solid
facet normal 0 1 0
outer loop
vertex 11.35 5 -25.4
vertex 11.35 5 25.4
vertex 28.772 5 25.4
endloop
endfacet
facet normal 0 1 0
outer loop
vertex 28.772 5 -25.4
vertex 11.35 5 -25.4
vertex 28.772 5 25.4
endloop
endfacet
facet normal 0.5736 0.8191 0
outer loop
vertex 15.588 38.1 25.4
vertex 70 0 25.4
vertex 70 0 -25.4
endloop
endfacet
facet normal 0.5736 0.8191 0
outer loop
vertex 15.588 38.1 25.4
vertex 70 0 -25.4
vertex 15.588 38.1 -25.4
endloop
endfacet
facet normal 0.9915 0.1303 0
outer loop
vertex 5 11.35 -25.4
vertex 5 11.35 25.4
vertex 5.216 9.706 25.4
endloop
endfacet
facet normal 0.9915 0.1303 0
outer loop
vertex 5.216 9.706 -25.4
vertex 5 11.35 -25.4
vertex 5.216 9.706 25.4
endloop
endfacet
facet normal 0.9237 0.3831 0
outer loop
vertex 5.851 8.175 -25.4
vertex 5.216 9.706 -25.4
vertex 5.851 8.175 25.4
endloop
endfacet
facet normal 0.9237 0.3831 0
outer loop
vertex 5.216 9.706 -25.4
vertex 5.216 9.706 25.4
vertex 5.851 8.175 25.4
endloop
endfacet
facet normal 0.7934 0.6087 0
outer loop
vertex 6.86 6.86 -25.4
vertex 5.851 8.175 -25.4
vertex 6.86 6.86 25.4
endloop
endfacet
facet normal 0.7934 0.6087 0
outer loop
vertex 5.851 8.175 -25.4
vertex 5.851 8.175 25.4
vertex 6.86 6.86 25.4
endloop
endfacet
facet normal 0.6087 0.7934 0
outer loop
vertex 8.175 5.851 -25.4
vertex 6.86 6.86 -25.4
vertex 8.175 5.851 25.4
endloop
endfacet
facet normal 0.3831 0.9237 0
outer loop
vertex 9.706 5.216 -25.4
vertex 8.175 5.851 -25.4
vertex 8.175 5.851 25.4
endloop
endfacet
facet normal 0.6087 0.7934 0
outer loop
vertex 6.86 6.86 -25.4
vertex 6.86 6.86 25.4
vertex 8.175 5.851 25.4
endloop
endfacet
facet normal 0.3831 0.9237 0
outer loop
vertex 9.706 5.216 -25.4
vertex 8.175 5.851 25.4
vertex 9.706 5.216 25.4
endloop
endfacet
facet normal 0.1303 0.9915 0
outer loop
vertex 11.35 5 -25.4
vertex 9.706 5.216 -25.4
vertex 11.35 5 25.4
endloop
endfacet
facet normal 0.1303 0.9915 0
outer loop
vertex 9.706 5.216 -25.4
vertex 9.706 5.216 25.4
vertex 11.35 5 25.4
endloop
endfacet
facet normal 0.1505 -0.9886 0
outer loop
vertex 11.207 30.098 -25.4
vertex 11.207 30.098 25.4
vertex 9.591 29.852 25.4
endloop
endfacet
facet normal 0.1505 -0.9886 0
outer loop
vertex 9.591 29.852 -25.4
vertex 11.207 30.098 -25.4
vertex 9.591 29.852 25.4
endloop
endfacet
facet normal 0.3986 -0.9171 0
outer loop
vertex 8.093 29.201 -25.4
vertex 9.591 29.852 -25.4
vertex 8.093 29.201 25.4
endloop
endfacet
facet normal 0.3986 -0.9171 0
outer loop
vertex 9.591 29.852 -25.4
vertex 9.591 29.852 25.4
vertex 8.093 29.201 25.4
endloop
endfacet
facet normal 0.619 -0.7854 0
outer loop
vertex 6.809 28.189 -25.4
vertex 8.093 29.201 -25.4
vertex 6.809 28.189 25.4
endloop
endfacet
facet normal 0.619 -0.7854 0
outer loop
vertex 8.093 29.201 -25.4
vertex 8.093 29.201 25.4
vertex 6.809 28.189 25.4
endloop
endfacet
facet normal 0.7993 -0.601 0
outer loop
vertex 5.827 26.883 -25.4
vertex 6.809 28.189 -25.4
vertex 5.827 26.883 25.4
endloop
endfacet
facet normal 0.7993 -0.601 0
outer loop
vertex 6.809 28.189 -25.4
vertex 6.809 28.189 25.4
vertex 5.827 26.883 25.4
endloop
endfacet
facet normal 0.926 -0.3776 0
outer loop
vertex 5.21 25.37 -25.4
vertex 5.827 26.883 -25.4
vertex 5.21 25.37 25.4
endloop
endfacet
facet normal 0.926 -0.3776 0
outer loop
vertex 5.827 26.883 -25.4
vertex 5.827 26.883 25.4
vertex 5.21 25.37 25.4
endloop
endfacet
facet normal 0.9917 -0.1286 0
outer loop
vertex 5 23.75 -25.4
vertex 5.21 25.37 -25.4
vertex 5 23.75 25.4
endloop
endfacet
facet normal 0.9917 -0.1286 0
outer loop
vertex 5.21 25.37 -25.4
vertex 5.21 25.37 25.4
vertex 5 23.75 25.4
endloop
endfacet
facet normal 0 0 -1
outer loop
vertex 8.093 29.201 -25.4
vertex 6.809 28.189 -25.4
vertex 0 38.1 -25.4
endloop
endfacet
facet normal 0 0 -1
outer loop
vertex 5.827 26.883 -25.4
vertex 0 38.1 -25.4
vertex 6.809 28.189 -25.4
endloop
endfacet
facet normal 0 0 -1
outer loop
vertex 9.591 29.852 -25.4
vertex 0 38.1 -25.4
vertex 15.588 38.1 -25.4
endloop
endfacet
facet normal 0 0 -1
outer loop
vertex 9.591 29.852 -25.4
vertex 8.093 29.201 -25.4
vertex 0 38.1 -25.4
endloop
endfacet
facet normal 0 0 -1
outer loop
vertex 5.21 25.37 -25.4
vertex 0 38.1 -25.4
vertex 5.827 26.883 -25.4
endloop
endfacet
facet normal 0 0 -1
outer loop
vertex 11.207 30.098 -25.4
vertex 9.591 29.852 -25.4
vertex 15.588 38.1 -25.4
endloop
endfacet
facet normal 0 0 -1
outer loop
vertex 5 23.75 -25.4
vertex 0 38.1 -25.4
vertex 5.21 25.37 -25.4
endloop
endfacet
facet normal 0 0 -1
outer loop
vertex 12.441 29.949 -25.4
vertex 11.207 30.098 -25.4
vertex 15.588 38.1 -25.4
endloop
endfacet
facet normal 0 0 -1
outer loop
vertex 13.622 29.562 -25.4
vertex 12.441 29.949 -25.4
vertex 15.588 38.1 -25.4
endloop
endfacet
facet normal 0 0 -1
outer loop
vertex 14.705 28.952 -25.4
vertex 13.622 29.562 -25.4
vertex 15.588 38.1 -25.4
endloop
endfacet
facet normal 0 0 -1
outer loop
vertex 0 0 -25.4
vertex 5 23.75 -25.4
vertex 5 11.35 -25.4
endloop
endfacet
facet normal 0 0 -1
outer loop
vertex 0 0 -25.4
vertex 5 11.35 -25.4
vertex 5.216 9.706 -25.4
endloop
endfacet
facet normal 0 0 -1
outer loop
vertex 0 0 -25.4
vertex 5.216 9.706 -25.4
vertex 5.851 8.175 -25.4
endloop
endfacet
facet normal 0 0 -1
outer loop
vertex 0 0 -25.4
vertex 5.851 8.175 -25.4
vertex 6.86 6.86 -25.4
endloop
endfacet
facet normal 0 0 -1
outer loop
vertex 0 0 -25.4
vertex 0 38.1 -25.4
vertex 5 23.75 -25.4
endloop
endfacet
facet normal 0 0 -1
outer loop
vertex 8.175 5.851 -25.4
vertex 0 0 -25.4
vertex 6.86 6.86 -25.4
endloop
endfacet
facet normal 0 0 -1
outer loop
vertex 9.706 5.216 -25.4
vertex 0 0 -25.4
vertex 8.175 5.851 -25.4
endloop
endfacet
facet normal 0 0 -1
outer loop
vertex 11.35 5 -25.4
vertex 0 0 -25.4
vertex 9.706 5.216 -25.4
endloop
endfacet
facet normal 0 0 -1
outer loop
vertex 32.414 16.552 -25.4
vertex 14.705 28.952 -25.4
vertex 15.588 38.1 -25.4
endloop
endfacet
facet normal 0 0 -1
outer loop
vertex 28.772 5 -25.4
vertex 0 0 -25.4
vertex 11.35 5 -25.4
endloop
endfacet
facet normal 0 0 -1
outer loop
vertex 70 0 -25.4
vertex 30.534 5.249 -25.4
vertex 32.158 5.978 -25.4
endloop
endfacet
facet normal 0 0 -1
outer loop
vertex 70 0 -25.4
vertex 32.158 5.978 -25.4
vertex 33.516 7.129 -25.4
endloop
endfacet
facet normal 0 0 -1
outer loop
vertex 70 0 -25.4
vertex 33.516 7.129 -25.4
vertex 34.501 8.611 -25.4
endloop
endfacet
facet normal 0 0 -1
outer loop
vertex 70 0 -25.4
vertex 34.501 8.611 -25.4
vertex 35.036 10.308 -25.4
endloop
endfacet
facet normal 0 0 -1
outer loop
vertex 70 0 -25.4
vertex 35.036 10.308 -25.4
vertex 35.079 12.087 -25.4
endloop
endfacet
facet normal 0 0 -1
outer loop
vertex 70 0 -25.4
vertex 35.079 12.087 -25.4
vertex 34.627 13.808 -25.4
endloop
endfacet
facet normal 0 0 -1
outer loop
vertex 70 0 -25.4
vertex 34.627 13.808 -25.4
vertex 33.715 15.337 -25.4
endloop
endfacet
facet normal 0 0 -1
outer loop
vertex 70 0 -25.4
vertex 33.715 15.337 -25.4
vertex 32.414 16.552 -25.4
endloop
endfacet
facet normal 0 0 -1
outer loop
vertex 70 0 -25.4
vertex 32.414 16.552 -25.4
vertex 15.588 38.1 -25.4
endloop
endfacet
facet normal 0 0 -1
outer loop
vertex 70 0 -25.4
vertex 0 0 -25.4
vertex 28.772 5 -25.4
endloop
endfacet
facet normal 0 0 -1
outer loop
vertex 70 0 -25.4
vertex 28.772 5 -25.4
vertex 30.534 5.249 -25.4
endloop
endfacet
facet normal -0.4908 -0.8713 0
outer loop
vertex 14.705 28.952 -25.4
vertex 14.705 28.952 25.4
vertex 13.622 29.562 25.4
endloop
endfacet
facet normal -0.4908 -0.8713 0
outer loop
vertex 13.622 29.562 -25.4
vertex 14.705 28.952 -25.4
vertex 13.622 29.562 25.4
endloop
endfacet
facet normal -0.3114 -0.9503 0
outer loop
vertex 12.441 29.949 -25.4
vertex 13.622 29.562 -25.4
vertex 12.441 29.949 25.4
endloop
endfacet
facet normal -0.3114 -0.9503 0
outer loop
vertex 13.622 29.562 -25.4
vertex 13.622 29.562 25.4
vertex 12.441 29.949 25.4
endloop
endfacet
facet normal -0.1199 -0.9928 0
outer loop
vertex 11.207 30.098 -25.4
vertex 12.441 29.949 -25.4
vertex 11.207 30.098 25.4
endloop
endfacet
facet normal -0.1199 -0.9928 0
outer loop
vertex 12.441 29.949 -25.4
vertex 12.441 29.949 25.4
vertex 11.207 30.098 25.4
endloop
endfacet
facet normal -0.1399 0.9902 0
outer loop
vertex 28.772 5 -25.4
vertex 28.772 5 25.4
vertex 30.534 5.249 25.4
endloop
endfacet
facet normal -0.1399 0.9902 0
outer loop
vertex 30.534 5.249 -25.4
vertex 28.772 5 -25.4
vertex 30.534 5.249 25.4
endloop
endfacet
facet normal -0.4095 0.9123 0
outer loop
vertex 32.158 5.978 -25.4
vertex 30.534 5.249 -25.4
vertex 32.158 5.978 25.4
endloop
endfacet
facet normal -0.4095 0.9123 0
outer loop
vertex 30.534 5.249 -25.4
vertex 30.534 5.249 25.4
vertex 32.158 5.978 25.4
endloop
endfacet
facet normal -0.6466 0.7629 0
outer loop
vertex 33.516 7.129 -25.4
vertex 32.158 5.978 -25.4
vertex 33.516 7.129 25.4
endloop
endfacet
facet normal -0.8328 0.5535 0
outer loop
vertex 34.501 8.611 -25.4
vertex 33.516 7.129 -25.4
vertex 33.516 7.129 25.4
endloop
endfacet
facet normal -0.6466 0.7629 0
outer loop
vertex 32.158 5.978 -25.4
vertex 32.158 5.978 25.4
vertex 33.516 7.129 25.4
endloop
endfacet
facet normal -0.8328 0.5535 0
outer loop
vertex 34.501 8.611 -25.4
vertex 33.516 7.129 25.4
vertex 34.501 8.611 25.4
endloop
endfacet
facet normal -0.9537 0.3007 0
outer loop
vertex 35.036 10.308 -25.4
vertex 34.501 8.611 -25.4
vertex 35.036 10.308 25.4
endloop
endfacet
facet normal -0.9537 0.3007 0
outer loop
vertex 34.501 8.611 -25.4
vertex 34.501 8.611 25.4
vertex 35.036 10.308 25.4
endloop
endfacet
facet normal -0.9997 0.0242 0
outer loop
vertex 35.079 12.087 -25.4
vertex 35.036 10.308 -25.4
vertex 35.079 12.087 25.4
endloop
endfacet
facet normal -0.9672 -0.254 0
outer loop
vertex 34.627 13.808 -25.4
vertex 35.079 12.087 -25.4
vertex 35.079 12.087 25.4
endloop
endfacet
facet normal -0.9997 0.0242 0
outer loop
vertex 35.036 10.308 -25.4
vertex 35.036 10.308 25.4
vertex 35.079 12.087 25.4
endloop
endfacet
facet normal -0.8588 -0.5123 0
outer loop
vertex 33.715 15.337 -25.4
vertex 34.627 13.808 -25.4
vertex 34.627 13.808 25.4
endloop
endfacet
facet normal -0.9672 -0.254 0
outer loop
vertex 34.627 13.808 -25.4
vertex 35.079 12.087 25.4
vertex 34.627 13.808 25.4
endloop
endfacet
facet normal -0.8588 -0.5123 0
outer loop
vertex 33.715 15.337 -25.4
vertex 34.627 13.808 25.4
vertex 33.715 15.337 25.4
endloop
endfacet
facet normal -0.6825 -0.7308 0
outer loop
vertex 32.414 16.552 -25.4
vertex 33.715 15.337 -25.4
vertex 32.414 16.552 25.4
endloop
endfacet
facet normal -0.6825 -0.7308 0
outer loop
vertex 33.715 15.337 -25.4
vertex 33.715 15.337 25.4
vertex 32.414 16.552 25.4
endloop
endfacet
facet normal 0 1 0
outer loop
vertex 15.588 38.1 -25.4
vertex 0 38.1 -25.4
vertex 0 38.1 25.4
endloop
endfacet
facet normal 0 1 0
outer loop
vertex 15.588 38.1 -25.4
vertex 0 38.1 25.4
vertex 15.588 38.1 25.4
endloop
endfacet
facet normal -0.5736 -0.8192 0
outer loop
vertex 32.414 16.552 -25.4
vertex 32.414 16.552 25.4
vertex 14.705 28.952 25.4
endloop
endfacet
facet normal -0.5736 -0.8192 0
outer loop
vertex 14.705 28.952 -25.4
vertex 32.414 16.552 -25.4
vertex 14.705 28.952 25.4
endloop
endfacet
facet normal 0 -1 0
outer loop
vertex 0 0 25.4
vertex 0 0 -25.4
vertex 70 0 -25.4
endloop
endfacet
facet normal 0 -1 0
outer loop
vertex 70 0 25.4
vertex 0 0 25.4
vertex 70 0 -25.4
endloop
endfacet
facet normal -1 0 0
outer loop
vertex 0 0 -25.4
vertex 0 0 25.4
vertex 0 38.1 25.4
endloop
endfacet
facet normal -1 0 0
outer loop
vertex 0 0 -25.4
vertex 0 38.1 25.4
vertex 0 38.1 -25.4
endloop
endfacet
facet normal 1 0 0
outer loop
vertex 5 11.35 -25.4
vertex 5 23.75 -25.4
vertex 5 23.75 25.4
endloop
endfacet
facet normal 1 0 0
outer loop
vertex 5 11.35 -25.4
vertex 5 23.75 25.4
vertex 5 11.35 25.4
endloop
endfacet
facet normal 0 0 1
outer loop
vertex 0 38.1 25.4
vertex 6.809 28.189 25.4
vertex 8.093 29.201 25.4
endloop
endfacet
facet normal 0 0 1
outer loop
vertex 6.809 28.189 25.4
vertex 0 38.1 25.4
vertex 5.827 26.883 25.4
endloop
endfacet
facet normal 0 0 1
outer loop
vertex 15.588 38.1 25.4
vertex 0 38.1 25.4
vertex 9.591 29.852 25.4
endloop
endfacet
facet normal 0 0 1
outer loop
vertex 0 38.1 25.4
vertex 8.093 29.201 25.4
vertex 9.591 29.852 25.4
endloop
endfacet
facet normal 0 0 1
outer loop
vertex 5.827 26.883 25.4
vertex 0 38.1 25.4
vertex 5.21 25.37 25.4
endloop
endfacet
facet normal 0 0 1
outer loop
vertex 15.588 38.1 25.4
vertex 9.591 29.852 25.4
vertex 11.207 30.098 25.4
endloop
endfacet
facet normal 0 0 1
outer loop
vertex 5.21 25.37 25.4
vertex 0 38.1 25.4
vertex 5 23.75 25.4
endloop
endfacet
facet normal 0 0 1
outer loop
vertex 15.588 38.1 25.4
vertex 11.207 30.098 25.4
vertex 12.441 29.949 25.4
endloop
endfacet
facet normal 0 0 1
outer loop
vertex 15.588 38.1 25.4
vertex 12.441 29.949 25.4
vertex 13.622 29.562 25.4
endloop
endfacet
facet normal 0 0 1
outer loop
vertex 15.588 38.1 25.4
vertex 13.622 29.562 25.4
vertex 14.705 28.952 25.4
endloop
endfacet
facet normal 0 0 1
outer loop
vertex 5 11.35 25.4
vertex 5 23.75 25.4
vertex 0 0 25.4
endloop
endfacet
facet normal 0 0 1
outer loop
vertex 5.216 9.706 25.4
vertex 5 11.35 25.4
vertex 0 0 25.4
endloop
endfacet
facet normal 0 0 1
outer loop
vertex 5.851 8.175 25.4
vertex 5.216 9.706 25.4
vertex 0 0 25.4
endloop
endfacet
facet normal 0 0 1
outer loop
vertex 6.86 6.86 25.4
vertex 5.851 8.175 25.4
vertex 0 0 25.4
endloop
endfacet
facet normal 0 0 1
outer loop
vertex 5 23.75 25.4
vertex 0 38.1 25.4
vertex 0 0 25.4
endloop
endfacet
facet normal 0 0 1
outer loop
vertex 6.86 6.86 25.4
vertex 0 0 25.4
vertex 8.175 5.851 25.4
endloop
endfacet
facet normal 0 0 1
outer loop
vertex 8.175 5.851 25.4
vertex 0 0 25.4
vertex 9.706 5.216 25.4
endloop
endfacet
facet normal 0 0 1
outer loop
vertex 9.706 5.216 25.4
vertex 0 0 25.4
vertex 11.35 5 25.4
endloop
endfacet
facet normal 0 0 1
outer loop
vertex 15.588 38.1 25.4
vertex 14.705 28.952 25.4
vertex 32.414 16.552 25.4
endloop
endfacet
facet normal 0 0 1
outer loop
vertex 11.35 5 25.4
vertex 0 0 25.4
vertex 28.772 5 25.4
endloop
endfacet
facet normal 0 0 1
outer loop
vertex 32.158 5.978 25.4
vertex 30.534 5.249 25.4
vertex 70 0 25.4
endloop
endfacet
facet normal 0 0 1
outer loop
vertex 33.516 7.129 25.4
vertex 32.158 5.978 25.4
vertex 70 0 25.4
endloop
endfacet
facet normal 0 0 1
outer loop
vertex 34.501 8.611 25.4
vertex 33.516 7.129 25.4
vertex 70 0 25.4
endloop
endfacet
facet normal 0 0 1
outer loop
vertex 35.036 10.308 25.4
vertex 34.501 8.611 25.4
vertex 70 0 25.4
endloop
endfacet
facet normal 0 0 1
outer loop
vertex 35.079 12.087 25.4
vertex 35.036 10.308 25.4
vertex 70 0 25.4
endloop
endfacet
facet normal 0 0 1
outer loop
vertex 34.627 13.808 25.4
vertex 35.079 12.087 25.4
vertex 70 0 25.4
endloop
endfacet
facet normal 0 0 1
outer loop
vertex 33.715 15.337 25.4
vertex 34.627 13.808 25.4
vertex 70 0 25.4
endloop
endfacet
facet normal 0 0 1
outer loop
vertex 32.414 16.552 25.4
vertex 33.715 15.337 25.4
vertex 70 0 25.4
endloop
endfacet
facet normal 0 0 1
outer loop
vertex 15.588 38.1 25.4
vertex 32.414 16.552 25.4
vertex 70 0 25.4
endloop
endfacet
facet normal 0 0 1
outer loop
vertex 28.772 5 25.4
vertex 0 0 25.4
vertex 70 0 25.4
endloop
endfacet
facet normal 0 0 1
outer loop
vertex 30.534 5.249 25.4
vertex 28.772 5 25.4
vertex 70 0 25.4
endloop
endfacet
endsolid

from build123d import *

# Parameters (mm, degrees)
CROQUIS1_W              = 70
CROQUIS1_H              = 50.8
SALIENTE_EXTRUIR1_DEPTH = 38.1
CORTAR_EXTRUIR5_DEPTH   = 95.510581418
CORTAR_EXTRUIR6_DEPTH   = 95.510581418


with BuildPart() as part:
    # Croquis1 → Saliente-Extruir1 (new body)
    with BuildSketch(Plane(origin=(0, 0, 0), x_dir=(1, 0, 0), z_dir=(0, 1, 0))):
        with Locations((35, 0)):
            Rectangle(CROQUIS1_W, CROQUIS1_H)
    extrude(amount=SALIENTE_EXTRUIR1_DEPTH)

    # Croquis2 → Cortar-Extruir5 (cut, through all)
    with BuildSketch(Plane.XY.offset(25.4)):
        Polygon((70, 0), (15.587560943, 38.1), (70, 38.1), align=None)
    extrude(amount=-CORTAR_EXTRUIR5_DEPTH, mode=Mode.SUBTRACT)

    # Croquis3 → Cortar-Extruir6 (cut, through all)
    with BuildSketch(Plane.XY.offset(25.4)):
        with BuildLine():
            ThreePointArc((11.206511661, 30.09837862), (6.809424544, 28.189107402), (5, 23.75))
            Line((5, 23.75), (5, 11.35))
            ThreePointArc((5, 11.35), (6.859871939, 6.859871939), (11.35, 5))
            Line((11.35, 5), (28.772058606, 5))
            ThreePointArc((28.772058606, 5), (34.828161244, 9.440518173), (32.414268977, 16.551615481))
            Line((32.414268977, 16.551615481), (14.705233694, 28.951615481))
            ThreePointArc((14.705233694, 28.951615481), (13.040811255, 29.784140775), (11.206511661, 30.09837862))
        make_face()
    extrude(amount=-CORTAR_EXTRUIR6_DEPTH, mode=Mode.SUBTRACT)


solid = part.part
